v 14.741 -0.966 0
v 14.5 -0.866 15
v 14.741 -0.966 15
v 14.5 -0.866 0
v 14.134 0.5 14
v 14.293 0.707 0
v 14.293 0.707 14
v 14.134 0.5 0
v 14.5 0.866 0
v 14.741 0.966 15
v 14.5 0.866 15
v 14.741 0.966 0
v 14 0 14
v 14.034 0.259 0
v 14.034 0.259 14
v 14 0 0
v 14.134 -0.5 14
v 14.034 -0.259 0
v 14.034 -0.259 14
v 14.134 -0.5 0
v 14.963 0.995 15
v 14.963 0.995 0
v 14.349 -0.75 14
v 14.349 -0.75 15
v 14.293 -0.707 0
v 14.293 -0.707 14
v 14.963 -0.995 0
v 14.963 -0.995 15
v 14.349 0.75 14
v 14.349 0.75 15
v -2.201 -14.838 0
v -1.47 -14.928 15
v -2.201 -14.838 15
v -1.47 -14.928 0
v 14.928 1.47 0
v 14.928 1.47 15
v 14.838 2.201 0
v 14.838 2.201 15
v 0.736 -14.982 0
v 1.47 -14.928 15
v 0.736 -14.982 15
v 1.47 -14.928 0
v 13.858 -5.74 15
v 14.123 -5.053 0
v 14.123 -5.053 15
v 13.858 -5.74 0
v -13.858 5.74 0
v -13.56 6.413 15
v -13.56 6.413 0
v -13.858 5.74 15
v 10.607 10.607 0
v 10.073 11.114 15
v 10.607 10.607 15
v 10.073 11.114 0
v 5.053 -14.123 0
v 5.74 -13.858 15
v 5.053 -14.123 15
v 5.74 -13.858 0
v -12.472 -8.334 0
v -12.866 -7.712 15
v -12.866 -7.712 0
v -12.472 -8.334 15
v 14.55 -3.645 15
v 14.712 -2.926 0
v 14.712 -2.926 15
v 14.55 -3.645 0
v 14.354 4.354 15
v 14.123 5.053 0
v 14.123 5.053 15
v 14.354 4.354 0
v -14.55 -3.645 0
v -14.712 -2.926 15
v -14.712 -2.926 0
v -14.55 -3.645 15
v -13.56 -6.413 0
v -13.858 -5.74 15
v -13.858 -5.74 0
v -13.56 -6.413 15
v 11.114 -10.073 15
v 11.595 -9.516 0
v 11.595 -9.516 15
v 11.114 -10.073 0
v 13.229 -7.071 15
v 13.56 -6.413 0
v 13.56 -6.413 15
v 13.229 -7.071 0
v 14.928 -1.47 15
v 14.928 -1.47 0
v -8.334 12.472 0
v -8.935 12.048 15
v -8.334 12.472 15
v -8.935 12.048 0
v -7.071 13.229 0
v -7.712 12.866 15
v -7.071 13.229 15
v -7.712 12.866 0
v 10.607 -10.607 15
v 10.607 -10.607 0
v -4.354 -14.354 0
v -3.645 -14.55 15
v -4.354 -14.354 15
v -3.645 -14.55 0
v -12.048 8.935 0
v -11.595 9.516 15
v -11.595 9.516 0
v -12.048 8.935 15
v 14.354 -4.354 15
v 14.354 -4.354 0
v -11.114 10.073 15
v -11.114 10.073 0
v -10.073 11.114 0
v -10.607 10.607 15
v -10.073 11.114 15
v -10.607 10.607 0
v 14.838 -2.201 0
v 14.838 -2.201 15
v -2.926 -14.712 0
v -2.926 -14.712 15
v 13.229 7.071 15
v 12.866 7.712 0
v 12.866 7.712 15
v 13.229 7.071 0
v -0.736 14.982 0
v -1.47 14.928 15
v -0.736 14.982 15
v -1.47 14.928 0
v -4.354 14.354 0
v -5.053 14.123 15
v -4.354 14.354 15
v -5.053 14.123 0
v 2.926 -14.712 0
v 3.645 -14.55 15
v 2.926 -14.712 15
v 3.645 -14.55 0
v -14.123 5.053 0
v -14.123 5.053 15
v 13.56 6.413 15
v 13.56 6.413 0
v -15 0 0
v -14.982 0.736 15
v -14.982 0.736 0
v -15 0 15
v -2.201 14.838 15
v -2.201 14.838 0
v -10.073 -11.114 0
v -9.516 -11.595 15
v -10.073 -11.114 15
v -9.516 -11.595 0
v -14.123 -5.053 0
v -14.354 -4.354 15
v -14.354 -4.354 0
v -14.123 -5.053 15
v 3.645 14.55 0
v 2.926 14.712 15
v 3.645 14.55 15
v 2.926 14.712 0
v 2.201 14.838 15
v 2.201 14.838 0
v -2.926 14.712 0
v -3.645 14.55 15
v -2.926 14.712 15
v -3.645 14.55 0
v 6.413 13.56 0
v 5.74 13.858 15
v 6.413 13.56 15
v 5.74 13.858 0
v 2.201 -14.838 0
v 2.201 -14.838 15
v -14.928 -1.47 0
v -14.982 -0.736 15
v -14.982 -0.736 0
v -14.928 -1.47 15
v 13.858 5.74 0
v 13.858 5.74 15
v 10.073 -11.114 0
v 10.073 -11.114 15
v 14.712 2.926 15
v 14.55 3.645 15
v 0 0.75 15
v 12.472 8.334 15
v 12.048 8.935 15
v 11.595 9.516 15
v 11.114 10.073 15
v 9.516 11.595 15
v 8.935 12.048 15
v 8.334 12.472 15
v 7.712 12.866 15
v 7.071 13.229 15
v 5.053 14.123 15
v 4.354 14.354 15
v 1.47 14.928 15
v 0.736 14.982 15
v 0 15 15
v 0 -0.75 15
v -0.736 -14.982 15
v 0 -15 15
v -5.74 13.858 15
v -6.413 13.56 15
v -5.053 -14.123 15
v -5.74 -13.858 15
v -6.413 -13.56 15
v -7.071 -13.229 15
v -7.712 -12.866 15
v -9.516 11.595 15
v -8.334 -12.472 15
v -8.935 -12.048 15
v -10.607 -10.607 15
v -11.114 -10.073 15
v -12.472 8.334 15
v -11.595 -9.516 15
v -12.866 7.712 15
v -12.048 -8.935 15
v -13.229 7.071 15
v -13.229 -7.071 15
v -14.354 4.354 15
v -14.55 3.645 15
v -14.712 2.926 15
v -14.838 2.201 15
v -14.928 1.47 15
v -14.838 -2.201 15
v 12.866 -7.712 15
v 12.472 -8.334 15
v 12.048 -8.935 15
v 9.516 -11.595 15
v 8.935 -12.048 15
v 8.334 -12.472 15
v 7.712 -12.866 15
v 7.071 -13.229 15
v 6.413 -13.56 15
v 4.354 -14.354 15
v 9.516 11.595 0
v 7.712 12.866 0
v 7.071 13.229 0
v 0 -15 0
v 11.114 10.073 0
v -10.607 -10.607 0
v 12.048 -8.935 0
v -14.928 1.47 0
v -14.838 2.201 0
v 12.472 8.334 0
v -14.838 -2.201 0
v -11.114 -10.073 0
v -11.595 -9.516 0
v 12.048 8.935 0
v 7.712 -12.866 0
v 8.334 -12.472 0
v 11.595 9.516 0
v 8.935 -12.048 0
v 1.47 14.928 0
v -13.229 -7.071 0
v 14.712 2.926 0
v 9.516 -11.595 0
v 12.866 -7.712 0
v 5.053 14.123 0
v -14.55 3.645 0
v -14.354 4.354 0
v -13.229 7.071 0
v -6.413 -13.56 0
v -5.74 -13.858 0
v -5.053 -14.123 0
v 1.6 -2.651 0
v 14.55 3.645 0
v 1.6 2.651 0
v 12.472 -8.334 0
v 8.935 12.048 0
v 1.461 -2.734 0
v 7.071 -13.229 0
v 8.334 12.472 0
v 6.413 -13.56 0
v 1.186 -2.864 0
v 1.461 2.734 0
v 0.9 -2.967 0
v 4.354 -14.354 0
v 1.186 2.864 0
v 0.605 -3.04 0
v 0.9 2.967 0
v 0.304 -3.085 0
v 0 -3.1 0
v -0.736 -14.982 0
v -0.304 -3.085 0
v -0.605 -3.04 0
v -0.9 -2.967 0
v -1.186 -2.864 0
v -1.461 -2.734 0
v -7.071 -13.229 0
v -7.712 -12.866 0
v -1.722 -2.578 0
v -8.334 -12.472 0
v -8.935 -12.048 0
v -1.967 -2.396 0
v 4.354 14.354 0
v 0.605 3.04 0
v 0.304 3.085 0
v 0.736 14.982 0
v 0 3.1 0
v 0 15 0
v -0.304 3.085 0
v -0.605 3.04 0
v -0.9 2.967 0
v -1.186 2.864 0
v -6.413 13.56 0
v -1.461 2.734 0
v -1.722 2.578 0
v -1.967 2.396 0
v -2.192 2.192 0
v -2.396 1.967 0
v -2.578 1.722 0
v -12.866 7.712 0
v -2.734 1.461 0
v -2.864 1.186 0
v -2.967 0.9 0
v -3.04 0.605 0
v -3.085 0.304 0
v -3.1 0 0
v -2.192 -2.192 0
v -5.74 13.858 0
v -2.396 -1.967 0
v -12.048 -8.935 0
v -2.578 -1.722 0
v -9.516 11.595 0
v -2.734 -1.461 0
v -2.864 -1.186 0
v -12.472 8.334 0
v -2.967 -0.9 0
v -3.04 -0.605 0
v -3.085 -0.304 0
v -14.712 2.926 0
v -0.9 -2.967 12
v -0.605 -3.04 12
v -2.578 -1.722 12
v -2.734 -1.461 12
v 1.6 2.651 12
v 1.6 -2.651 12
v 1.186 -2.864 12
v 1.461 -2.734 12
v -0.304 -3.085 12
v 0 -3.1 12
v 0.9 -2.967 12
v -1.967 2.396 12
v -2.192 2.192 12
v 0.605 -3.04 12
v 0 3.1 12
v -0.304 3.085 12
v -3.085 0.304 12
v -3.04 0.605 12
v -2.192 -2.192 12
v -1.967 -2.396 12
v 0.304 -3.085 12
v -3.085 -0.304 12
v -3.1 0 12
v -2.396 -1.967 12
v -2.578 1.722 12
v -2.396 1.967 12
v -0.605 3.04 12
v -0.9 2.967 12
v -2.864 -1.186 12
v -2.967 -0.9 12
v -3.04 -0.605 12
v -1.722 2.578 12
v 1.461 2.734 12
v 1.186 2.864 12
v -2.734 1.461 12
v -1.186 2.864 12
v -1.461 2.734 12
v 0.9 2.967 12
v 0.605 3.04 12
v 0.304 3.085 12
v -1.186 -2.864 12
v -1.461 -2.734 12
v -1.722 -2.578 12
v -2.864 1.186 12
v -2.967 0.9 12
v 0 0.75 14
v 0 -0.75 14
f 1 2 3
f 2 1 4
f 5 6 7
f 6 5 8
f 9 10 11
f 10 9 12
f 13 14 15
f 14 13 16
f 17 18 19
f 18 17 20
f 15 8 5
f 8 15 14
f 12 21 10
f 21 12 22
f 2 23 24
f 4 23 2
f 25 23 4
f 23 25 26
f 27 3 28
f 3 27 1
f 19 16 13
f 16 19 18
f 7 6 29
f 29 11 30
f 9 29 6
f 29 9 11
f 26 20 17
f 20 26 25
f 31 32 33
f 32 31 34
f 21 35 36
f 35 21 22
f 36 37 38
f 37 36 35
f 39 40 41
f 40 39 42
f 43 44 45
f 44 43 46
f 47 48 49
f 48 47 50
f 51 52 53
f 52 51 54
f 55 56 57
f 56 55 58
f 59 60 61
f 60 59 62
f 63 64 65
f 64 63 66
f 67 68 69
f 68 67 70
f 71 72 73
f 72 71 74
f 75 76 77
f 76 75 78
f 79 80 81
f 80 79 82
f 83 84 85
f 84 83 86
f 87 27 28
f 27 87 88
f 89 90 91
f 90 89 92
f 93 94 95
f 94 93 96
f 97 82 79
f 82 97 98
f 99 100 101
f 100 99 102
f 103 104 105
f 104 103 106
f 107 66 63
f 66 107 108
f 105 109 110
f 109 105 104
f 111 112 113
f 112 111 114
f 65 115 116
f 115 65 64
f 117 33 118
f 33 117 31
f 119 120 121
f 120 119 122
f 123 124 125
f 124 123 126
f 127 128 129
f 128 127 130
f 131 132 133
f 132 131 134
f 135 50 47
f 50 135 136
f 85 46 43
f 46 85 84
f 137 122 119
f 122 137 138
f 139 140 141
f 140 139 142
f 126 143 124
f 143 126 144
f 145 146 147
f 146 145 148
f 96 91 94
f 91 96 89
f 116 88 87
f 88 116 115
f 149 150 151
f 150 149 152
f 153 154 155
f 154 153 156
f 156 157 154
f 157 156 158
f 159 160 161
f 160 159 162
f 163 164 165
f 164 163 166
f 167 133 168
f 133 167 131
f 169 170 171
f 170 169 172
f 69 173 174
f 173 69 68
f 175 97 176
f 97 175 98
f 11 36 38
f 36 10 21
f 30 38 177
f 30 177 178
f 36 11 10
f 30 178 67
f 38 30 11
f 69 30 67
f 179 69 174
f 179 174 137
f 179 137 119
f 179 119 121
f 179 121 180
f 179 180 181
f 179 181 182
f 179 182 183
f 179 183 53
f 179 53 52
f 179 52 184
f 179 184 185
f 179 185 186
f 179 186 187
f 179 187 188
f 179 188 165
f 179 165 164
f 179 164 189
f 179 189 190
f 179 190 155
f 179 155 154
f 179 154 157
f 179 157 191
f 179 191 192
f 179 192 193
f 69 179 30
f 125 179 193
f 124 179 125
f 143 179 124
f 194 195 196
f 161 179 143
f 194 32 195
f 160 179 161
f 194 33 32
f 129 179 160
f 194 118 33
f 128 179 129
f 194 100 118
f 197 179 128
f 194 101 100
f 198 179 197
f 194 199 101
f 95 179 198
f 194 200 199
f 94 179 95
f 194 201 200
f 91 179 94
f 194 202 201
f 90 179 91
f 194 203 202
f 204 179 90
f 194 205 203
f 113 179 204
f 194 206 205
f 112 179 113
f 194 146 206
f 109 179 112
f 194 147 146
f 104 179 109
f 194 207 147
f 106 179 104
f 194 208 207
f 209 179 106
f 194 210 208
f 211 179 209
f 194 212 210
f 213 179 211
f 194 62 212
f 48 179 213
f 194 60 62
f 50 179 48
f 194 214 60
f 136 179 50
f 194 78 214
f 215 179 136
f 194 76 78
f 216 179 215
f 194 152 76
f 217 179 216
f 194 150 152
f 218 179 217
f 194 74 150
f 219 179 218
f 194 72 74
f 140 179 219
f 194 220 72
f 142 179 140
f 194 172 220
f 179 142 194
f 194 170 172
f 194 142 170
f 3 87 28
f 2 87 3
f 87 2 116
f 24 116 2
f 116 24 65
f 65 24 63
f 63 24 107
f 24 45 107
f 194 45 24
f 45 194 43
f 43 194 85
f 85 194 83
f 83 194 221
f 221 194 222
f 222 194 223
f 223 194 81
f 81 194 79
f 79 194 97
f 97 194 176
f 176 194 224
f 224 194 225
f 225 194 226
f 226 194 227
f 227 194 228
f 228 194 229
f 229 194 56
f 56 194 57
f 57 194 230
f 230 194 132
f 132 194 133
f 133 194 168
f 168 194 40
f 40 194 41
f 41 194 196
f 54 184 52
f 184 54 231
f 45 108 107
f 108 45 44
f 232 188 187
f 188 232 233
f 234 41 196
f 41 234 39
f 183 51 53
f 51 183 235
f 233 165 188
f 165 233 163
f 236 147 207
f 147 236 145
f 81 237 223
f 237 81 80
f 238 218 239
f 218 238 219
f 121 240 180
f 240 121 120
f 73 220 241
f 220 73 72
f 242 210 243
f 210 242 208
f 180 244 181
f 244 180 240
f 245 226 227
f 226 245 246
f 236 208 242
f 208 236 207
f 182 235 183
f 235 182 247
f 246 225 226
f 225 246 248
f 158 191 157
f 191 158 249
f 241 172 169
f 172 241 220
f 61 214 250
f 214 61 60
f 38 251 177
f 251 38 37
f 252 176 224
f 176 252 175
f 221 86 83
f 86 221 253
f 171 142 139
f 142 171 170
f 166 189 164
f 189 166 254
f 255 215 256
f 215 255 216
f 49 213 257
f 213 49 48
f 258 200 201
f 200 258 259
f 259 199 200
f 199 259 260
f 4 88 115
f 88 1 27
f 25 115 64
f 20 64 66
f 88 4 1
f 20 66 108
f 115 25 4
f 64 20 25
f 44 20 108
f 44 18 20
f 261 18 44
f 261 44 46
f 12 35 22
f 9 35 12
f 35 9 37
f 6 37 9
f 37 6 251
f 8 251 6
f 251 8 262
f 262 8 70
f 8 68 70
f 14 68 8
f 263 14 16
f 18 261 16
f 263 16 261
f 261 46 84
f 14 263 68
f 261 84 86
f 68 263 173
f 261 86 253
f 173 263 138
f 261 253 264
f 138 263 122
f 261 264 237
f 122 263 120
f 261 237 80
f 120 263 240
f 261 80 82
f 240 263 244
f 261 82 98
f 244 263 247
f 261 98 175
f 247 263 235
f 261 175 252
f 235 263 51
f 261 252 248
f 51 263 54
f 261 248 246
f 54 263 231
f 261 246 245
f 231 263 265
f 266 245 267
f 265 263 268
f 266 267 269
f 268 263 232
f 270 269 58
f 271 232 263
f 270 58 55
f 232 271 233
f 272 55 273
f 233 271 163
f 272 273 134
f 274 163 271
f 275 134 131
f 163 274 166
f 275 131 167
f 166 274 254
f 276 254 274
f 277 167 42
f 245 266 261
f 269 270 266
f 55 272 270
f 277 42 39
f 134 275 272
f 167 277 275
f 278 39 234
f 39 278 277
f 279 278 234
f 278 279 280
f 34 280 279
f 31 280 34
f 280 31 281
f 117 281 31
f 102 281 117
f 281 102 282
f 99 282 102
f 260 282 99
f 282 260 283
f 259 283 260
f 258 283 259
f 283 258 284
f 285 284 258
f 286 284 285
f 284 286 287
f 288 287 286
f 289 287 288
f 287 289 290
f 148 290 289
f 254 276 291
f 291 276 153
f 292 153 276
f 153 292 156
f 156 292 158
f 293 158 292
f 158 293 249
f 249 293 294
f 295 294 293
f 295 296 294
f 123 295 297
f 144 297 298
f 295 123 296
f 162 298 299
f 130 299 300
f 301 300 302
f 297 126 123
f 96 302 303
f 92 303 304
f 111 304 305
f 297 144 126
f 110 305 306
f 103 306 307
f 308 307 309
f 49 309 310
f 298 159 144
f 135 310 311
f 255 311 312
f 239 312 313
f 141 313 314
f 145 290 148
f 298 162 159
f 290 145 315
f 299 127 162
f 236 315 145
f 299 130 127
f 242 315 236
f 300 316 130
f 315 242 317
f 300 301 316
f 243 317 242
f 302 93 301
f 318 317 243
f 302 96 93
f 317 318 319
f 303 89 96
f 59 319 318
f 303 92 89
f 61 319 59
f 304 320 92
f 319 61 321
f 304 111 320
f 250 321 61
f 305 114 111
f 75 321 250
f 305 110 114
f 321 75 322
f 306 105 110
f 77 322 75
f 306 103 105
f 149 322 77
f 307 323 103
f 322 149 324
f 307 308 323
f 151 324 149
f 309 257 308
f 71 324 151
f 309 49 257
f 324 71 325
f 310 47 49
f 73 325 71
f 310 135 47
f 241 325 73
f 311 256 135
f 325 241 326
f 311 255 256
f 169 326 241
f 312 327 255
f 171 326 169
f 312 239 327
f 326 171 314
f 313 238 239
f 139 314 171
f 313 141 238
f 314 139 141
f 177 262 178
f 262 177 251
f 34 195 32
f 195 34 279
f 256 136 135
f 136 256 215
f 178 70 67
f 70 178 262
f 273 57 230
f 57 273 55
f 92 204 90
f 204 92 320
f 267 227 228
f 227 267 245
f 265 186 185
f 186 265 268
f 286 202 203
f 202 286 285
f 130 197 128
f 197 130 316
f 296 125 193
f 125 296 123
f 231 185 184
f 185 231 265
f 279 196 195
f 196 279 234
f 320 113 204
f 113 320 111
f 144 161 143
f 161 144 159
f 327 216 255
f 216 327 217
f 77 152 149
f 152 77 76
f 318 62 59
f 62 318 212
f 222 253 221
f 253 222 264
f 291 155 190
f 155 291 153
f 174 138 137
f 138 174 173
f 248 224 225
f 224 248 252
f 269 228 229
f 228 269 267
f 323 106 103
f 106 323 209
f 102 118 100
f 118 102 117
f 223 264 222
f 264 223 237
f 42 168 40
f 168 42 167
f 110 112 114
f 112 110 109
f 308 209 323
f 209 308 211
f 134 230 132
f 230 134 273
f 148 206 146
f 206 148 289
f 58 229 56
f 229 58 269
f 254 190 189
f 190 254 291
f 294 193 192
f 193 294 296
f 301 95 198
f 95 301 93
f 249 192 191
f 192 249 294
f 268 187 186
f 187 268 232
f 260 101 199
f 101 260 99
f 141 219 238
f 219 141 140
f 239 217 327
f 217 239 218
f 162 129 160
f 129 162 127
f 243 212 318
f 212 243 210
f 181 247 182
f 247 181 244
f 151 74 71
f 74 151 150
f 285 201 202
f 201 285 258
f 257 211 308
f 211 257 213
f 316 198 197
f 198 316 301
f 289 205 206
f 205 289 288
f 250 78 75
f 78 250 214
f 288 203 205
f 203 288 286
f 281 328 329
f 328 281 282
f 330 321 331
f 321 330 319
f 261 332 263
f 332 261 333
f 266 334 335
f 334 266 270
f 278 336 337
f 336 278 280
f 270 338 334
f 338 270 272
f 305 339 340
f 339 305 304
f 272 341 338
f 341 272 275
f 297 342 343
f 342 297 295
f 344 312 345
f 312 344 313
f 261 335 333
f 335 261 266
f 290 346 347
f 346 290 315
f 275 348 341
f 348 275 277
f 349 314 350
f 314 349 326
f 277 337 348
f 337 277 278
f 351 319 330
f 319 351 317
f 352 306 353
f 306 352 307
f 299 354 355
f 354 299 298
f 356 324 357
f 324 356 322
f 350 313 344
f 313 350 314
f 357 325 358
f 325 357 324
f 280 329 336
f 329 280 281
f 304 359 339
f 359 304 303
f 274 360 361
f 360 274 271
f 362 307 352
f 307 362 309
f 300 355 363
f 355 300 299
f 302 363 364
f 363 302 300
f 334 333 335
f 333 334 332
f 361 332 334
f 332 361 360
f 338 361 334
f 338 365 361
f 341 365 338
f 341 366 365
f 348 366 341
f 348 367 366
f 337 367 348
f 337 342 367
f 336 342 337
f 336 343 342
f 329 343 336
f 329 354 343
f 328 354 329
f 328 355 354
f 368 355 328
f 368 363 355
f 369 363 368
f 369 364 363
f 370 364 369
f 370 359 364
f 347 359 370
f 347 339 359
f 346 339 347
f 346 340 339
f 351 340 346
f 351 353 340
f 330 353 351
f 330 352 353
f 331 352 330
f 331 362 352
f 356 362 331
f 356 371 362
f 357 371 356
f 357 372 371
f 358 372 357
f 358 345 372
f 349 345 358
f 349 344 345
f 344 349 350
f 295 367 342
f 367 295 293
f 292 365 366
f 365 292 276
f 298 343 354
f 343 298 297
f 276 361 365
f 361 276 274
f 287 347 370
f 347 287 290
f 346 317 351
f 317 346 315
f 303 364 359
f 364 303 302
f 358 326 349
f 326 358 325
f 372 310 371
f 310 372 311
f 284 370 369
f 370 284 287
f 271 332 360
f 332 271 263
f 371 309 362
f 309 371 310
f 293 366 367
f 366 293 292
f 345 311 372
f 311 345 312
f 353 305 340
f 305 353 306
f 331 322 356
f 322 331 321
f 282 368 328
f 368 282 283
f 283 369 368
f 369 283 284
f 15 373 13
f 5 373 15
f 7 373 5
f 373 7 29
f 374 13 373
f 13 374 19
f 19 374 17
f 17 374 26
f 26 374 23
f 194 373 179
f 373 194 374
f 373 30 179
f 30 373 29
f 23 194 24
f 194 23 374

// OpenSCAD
// Replacement knob for a 6 mm D-shaft (hotplates, stirrers, power supplies)
// Category: quick fixes. D-shaped blind bore from the bottom, grip grooves and a
// pointer groove on top that lines up with the flat of the shaft.
// Print: PETG (heat near hotplates), 0.15 mm layers, 4 perimeters, bore face down.
// SPDX-License-Identifier: CERN-OHL-P-2.0

/* [Knob] */
knob_d = 30;
knob_h = 15;
shaft_d = 6.2;         // 6 mm shaft + 0.2 mm clearance
shaft_flat = 4.7;      // flat-to-round distance (4.5 mm nominal + clearance)
bore_depth = 12;
n_grooves = 0;
groove_d = 2;
pointer_w = 1.5;
pointer_depth = 1;

/* [Hidden] */
eps = 0.01;

difference() {
    cylinder(d = knob_d, h = knob_h, $fn = 128);
    // D-shaped bore; the flat faces +X
    translate([0, 0, -eps])
        linear_extrude(bore_depth + eps)
            intersection() {
                circle(d = shaft_d, $fn = 64);
                translate([-shaft_d / 2, -shaft_d / 2]) square([shaft_flat, shaft_d]);
            }
    // grip grooves
    for (i = [0 : n_grooves - 1])
        rotate(i * 360 / n_grooves)
            translate([knob_d / 2, 0, -eps]) cylinder(d = groove_d, h = knob_h + 2 * eps, $fn = 24);
    // pointer groove on top, pointing at the flat (+X)
    translate([0, -pointer_w / 2, knob_h - pointer_depth])
        cube([knob_d / 2 + 1, pointer_w, pointer_depth + eps]);
}
